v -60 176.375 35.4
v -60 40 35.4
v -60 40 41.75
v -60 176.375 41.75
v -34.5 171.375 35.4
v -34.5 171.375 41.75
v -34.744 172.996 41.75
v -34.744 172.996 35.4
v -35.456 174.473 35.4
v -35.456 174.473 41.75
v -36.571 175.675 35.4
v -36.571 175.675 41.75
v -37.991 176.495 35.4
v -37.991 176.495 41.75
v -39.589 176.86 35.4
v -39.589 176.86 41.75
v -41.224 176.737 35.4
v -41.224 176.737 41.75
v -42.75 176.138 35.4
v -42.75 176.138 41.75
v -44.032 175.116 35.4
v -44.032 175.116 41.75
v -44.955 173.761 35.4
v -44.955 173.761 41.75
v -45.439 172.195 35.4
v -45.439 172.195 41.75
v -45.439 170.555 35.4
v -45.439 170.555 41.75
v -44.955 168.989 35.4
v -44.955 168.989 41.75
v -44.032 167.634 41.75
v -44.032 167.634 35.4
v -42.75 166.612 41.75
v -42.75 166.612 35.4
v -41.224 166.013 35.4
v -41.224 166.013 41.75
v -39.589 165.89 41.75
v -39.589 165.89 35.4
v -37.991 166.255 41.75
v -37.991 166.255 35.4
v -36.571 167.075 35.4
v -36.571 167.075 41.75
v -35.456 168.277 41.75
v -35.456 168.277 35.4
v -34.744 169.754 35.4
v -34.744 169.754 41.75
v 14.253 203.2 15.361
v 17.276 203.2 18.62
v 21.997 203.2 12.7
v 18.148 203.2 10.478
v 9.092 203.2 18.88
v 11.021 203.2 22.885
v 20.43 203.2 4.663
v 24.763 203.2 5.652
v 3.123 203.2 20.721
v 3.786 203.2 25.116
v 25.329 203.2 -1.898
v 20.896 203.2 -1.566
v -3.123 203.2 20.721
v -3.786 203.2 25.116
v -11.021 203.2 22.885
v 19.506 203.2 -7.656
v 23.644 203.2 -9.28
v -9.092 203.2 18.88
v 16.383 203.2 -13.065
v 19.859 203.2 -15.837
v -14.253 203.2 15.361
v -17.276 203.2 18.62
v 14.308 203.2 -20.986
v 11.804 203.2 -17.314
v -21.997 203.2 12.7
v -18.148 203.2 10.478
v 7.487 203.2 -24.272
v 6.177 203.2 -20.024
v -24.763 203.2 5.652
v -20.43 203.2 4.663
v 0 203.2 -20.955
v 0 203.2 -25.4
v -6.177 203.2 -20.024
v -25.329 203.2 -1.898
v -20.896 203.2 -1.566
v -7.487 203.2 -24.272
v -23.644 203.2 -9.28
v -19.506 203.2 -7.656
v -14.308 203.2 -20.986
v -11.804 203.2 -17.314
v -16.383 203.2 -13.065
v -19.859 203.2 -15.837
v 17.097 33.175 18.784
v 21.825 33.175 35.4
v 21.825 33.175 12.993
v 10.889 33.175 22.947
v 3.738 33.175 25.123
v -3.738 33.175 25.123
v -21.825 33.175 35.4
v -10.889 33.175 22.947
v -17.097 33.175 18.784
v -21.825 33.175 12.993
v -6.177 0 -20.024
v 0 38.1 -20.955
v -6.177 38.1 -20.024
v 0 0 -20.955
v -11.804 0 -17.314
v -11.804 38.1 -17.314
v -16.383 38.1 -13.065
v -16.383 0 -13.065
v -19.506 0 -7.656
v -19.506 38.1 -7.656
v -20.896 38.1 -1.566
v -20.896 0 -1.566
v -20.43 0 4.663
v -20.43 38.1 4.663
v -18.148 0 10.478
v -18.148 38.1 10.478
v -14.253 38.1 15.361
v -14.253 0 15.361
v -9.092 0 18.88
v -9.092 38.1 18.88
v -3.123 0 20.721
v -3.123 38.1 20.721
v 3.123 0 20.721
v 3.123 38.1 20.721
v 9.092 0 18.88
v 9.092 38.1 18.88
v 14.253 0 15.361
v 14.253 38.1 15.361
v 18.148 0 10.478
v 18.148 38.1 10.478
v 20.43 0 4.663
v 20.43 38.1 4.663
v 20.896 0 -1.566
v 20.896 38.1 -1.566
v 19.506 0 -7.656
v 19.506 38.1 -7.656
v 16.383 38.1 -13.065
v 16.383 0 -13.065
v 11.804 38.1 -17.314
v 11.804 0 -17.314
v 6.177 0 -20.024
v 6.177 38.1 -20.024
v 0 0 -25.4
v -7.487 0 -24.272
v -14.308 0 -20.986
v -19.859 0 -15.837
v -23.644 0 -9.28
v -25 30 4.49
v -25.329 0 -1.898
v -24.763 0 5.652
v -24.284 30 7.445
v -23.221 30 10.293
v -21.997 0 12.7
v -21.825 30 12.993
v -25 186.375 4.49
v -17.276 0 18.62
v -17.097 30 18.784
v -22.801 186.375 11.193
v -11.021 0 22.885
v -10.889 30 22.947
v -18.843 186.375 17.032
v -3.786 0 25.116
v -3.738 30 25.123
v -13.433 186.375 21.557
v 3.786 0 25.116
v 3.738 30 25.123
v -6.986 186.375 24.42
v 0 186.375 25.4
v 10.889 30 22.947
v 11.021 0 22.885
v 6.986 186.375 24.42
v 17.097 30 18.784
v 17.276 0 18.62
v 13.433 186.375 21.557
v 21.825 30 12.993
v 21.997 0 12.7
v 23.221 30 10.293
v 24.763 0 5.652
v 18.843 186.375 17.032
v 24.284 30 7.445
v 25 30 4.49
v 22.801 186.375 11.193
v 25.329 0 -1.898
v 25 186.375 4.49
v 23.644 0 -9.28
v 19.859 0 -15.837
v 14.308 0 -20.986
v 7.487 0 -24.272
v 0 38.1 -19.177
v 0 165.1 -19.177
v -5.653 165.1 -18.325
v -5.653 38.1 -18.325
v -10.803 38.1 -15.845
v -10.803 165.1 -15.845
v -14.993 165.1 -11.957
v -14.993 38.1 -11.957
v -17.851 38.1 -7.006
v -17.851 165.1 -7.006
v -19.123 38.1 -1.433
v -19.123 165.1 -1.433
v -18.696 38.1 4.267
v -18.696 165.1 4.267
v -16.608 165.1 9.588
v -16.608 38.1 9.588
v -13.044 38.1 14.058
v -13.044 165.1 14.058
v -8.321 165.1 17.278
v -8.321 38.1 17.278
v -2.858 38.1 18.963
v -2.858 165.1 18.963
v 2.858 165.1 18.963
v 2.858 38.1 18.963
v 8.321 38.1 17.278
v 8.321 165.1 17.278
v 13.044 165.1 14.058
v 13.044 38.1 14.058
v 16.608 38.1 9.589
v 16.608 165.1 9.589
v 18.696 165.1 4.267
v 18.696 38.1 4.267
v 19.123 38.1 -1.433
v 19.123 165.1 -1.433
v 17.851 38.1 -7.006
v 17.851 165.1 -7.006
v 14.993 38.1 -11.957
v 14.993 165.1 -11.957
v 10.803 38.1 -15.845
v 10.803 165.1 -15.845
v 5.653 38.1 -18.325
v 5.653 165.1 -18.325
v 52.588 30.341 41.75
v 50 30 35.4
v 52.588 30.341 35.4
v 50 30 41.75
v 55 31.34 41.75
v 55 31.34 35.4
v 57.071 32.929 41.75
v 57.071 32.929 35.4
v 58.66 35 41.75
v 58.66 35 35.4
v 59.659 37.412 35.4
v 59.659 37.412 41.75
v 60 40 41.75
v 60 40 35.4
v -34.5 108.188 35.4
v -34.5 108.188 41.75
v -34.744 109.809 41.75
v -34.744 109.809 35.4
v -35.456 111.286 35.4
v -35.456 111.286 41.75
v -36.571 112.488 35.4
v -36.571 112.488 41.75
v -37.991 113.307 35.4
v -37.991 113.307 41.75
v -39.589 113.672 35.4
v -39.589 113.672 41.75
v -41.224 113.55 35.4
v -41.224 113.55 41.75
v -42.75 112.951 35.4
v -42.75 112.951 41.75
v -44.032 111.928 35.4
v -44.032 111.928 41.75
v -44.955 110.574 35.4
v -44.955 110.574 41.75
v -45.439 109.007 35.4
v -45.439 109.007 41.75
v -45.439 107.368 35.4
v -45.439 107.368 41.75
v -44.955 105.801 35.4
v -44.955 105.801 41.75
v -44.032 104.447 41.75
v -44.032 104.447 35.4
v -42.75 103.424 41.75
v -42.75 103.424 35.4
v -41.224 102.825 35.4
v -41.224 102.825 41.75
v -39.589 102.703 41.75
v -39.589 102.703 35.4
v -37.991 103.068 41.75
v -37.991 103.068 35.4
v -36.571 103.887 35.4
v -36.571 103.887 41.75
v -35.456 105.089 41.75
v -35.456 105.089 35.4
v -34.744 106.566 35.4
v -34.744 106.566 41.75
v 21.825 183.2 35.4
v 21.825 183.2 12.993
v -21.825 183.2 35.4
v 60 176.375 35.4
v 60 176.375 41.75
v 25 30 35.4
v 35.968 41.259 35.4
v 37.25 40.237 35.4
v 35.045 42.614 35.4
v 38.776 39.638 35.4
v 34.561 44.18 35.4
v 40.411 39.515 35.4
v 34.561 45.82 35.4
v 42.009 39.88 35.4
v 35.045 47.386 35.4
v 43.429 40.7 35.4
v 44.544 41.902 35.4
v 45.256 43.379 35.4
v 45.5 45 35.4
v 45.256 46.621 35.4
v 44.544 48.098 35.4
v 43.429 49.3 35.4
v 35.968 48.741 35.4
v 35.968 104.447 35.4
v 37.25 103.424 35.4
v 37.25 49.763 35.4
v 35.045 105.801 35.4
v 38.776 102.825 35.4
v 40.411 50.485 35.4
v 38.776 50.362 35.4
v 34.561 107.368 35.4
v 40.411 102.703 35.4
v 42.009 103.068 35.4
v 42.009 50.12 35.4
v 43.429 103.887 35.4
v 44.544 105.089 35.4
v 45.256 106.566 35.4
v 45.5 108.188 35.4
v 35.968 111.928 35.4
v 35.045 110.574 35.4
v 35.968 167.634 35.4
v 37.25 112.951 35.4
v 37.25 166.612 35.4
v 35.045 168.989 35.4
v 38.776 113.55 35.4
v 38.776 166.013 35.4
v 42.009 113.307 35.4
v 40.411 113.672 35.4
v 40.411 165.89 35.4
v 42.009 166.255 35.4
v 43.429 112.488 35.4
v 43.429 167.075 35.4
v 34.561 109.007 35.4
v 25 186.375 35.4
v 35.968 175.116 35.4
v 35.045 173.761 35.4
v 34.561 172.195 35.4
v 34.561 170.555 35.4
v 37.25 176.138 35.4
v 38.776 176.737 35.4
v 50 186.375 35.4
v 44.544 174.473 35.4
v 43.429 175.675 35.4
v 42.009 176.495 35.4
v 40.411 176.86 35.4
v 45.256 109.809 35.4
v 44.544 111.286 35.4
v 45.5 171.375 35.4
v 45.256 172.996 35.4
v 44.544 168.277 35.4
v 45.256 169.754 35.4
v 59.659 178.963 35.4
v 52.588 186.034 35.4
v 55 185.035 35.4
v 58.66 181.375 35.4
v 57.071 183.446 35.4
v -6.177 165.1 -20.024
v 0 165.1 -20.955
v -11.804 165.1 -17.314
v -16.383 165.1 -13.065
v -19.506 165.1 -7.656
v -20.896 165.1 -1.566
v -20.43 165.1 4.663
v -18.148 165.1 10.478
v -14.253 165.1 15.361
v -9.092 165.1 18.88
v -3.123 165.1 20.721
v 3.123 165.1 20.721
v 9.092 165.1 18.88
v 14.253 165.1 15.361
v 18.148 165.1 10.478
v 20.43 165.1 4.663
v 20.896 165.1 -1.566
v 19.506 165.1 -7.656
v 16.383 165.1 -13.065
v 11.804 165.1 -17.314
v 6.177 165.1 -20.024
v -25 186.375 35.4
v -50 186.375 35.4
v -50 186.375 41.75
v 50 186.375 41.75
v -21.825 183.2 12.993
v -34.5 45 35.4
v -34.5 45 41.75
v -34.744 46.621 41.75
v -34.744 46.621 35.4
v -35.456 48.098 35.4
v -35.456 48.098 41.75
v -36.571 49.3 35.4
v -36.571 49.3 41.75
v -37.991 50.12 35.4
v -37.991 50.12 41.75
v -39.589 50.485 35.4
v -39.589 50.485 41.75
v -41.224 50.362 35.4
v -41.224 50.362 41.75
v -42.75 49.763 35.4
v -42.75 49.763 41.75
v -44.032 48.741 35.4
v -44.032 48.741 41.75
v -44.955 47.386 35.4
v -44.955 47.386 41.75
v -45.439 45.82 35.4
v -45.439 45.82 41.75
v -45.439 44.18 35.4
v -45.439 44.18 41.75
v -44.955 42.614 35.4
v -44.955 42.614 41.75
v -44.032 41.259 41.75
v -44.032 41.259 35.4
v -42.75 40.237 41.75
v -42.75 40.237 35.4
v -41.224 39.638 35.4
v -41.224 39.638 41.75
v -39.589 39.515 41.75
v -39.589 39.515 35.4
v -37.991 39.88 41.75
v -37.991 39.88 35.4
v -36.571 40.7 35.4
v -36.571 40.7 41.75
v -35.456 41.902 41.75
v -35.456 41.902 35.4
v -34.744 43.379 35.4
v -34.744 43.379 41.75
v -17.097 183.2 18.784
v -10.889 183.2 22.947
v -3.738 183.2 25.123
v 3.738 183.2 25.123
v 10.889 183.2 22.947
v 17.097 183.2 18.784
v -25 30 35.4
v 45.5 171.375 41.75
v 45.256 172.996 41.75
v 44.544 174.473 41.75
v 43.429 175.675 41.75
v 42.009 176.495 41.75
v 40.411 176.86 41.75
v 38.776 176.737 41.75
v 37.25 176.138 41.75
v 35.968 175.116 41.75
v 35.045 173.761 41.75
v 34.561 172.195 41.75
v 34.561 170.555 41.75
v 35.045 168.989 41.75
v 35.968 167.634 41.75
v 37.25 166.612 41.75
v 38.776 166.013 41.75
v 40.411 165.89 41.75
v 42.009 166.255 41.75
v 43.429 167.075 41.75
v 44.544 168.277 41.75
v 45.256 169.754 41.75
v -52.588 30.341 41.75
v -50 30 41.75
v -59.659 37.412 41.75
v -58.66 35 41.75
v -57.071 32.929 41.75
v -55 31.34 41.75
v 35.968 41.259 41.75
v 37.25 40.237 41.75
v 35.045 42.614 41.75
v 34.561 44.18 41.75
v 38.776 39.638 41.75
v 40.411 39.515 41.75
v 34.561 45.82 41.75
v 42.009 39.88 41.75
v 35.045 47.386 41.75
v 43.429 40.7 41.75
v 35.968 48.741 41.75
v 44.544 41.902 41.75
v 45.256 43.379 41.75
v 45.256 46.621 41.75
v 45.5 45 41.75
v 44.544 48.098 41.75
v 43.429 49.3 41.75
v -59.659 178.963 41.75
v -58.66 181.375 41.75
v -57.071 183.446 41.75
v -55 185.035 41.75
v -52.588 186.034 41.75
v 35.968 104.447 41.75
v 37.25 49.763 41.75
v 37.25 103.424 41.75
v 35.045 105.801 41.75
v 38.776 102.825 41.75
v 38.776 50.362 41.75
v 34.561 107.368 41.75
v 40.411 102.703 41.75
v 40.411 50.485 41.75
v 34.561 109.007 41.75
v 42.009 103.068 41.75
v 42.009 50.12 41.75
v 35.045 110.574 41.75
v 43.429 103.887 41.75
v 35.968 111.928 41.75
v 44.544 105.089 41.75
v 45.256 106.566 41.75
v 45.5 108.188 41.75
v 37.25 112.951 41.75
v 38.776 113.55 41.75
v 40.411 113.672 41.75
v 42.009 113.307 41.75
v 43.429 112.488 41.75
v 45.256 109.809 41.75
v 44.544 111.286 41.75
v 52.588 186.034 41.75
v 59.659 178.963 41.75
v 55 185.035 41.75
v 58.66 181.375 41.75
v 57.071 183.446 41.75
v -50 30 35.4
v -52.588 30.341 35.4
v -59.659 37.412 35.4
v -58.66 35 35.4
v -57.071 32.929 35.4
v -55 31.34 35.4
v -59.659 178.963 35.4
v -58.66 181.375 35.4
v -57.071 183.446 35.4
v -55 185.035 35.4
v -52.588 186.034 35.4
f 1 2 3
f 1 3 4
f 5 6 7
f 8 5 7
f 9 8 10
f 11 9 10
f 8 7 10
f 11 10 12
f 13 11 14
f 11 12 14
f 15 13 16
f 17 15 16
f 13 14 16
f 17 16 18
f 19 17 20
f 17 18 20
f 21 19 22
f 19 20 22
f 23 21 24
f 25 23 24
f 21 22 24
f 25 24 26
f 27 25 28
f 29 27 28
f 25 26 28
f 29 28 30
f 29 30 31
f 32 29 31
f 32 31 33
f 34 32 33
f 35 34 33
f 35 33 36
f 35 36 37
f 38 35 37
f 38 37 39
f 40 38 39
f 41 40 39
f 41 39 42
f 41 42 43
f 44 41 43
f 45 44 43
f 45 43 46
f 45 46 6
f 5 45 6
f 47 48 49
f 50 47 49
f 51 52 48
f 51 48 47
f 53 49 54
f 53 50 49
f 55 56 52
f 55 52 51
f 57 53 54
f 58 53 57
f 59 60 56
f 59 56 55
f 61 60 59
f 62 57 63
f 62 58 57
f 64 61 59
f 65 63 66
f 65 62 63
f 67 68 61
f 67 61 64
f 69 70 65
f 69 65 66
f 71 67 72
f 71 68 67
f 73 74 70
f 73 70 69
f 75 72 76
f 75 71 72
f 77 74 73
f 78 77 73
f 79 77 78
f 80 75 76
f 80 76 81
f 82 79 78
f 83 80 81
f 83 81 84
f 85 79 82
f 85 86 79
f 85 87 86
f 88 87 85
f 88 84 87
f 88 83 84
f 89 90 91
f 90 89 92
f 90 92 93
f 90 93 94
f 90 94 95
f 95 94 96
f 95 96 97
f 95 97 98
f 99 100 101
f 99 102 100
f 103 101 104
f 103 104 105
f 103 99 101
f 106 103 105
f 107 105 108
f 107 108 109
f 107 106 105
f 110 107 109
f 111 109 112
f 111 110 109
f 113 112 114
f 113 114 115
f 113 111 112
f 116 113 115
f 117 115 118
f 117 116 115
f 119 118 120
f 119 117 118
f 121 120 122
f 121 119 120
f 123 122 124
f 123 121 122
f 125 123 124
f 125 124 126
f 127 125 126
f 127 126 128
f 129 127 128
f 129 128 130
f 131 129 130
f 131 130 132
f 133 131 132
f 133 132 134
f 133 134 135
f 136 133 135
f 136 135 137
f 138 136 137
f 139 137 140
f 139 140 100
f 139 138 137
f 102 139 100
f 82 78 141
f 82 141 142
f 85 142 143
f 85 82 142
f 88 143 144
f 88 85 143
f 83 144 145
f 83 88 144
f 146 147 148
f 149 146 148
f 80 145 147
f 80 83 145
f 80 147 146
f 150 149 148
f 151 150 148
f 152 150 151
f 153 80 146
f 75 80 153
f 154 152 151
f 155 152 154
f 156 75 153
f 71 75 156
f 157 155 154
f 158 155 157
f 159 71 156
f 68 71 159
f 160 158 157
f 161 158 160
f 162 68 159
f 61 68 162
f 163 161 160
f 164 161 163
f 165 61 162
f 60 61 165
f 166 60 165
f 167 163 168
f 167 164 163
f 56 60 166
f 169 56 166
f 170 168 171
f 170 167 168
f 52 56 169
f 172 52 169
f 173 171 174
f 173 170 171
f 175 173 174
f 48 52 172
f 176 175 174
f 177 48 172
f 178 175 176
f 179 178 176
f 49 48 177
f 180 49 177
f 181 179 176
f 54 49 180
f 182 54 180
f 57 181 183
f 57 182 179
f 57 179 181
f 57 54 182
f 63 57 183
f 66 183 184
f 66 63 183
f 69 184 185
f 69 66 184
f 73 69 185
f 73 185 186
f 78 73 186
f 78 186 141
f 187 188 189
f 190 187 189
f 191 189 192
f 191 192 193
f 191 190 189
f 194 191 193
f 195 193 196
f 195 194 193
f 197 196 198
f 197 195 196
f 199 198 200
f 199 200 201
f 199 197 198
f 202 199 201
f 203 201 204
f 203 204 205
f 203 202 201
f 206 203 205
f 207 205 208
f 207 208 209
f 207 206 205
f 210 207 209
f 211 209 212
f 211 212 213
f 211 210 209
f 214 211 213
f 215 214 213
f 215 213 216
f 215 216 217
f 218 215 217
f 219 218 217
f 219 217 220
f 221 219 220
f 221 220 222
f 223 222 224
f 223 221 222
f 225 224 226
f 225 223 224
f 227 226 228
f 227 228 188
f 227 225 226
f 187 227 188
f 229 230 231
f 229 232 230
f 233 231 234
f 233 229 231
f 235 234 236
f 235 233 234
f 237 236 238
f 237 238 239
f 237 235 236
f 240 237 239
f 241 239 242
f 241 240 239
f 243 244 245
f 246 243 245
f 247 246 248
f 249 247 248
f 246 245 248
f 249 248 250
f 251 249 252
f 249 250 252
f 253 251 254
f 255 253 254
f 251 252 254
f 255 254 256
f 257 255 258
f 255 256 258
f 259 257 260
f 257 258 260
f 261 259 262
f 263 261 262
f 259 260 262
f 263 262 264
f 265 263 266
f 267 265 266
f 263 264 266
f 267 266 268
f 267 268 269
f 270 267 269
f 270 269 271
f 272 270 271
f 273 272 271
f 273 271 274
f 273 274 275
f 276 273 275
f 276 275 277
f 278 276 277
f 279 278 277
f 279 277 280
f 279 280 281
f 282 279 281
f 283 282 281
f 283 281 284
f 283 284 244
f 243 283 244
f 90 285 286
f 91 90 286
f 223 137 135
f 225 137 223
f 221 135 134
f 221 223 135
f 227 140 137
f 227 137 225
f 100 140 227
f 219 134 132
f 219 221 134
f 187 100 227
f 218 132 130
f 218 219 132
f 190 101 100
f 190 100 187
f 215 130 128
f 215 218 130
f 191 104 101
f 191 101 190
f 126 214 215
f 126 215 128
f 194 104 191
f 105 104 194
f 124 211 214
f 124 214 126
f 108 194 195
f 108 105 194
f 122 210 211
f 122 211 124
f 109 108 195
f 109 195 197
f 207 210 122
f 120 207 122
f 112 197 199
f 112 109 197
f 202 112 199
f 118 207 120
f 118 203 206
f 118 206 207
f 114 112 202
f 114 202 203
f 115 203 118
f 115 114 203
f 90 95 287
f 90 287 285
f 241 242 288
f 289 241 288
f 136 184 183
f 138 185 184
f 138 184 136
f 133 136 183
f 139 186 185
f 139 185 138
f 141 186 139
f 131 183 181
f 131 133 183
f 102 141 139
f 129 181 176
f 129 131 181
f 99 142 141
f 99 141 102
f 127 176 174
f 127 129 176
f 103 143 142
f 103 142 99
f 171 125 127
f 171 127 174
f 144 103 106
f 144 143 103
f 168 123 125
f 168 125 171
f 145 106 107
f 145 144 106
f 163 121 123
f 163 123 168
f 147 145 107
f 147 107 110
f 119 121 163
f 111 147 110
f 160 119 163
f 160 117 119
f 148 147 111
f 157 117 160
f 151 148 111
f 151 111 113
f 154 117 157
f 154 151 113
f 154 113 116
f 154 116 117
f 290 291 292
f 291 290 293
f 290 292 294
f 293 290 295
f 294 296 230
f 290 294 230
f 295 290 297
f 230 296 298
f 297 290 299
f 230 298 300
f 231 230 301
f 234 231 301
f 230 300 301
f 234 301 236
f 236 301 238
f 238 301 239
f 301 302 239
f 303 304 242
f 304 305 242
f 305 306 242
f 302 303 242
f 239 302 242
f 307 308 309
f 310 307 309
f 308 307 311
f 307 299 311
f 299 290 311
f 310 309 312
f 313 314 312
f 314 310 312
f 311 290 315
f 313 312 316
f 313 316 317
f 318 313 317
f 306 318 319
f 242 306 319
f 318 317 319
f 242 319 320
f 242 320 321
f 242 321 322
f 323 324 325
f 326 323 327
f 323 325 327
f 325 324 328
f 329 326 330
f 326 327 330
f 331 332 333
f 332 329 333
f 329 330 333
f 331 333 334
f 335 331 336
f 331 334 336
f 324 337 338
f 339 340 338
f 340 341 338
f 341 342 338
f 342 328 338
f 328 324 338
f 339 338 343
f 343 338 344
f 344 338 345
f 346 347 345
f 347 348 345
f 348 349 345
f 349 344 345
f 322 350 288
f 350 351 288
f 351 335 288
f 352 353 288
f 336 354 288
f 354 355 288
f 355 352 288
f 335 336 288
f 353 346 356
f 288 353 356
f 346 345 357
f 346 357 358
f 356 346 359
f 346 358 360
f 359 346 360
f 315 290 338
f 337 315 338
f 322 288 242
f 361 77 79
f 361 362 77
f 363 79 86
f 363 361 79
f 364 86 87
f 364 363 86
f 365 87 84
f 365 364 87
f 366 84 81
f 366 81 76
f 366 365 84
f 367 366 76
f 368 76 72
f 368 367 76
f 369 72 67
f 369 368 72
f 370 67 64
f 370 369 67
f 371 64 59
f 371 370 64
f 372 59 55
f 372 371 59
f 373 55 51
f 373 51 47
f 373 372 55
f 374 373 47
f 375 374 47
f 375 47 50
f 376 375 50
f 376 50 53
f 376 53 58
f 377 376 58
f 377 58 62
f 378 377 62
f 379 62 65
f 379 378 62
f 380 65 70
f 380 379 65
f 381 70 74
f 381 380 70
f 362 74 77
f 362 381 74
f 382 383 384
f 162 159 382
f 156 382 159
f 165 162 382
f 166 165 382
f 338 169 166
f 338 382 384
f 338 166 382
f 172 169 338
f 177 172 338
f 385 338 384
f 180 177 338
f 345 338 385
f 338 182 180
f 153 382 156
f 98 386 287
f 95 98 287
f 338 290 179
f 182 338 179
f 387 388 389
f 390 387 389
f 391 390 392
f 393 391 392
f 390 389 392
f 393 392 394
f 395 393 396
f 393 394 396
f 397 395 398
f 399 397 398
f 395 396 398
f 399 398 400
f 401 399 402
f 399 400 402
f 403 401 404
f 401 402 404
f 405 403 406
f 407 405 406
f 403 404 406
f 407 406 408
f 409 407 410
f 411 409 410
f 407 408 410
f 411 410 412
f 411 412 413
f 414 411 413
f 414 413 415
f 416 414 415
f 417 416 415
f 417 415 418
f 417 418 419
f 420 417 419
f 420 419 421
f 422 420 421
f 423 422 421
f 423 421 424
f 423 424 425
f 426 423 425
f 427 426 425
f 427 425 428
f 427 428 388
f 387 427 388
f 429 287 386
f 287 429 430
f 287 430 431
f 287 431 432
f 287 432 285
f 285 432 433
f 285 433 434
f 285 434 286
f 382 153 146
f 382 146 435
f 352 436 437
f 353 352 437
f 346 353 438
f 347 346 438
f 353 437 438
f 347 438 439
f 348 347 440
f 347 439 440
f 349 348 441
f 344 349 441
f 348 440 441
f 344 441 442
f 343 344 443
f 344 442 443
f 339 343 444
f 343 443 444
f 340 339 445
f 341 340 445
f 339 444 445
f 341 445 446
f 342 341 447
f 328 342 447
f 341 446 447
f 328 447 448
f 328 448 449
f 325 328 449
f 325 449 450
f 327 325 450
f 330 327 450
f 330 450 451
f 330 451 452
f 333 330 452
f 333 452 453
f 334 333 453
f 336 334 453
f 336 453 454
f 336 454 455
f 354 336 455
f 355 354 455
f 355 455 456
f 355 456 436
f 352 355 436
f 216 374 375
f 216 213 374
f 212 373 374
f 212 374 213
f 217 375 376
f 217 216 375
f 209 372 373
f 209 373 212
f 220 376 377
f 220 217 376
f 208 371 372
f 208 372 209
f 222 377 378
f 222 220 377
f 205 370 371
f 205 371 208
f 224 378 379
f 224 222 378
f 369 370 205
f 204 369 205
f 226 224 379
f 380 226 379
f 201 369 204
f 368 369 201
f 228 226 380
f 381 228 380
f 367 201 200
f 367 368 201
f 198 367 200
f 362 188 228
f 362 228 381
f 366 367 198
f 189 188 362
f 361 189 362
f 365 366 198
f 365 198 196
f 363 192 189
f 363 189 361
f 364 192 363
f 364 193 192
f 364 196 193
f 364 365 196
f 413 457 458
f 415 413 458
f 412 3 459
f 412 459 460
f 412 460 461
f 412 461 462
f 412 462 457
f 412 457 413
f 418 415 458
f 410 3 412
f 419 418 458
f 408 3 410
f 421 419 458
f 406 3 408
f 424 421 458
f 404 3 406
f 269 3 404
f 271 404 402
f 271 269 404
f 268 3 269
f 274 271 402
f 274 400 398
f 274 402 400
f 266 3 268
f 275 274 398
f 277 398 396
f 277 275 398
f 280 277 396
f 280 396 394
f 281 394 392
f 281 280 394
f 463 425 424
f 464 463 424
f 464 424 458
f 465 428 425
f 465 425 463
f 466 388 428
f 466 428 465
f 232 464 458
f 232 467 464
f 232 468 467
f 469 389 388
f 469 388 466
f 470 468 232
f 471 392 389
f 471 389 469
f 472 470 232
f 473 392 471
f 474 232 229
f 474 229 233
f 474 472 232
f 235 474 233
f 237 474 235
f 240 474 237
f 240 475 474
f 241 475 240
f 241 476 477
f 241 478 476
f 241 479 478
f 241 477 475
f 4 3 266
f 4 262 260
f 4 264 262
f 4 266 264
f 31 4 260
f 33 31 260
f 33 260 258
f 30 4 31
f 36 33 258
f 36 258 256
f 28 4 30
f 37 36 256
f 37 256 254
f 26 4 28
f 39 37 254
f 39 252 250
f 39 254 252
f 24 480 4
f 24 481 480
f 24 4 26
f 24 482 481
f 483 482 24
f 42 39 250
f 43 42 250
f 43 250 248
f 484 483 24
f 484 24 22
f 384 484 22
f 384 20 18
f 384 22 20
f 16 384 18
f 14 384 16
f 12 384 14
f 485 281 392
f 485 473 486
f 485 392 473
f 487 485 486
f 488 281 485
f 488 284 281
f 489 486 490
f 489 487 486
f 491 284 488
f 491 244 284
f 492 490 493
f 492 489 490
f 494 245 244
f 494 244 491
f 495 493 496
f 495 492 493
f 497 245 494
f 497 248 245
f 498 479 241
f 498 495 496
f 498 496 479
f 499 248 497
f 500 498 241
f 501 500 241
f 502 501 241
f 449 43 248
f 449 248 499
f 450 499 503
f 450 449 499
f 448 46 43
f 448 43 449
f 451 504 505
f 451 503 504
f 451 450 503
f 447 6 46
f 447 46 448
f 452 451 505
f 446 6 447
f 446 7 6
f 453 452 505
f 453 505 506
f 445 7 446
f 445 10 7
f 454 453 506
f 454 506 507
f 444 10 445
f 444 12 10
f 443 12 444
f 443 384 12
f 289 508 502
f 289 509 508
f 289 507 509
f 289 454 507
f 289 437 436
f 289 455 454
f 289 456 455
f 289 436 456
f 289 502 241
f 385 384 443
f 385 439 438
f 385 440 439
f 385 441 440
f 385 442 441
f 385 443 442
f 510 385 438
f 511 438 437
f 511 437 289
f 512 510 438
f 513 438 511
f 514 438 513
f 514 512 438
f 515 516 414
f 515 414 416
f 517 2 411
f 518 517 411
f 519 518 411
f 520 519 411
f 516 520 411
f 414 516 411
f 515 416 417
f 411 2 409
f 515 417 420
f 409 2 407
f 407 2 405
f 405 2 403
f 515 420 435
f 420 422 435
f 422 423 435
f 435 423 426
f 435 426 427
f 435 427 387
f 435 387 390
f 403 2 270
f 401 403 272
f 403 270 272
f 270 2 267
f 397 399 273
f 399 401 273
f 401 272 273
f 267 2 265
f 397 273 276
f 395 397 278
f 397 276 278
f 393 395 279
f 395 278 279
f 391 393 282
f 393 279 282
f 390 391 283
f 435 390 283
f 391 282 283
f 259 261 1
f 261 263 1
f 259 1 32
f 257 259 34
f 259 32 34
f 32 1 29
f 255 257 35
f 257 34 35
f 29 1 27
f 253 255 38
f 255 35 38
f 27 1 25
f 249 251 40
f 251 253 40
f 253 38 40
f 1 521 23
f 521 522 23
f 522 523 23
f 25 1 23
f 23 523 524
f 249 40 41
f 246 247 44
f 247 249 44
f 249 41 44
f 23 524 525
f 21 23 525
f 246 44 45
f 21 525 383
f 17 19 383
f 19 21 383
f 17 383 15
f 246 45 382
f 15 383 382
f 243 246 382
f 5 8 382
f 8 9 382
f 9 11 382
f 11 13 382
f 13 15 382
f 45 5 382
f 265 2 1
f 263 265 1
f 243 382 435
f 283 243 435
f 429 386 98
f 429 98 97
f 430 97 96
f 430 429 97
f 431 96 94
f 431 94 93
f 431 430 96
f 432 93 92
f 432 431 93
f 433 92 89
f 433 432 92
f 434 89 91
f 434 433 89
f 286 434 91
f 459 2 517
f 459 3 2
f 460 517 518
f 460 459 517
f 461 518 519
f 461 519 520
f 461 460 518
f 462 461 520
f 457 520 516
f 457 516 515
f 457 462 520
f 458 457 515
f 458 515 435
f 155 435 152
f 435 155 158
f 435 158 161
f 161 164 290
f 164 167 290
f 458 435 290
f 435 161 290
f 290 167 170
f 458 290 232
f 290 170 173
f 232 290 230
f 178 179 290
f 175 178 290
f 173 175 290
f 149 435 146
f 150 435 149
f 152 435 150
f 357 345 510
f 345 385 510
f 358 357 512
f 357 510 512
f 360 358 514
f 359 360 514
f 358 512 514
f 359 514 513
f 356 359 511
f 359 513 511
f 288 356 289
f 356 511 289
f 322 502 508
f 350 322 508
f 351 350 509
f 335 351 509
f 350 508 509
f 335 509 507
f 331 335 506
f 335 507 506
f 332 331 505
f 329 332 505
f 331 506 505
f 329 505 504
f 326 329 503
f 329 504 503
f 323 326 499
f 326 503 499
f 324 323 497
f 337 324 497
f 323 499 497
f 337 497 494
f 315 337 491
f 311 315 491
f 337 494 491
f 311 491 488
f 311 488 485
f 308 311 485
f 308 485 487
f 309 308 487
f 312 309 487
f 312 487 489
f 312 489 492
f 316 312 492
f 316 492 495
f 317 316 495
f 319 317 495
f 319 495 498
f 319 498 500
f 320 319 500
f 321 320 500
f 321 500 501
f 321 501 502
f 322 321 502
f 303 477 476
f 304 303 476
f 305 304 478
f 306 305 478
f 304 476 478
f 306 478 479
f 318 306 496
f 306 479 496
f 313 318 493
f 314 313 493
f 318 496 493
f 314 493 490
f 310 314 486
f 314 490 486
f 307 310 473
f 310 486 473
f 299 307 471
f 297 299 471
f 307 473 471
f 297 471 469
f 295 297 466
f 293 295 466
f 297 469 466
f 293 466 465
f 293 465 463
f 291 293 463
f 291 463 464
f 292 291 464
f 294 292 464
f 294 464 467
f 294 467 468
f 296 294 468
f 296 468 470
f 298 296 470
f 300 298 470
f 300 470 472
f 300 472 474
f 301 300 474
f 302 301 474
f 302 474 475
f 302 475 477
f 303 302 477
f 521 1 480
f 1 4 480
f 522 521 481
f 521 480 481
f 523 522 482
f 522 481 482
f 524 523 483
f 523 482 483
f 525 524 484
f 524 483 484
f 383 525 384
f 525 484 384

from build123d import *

# Parameters (mm, degrees)
BOSS_EXTRUDE1_START   = -3.175
BOSS_EXTRUDE1_DEPTH   = 3.175
BOSS_EXTRUDE9_START   = -153.2
BOSS_EXTRUDE9_DEPTH   = 153.2
BOSS_EXTRUDE5_START   = 3.175
BOSS_EXTRUDE5_DEPTH   = 3.175
SKETCH18_W            = 120
SKETCH18_H            = 156.375
BOSS_EXTRUDE10_DEPTH  = 6.35
FILLET1_R             = 10
M10_CLEARANCE_HOLE2_D = 11


with BuildPart() as part:
    # Sketch12 → Revolve1 (revolve)
    with BuildSketch(Plane.XY, mode=Mode.PRIVATE) as revolve1_sk:
        Polygon((-25.399999994, 0), (-25.399999994, 203.2), (-20.955, 203.2), (-20.955, 165.1), (-19.177, 165.1), (-19.177, 38.1), (-20.955, 38.1), (-20.955, 0), align=None)
    revolve(revolve1_sk.sketch.rotate(Axis((0, 0, 0), (0, 1, 0)), 270), axis=Axis((0, 0, 0), (0, 1, 0)))

    # Sketch14 → Boss-Extrude1 (add)
    with BuildSketch(Plane(origin=(0, 30, 0), x_dir=(-1, 0, 0), z_dir=(0, -1, 0)).offset(BOSS_EXTRUDE1_START)):
        with BuildLine():
            Line((-21.825, -12.993435831), (-21.825, -35.399999994))
            Line((-21.825, -35.399999994), (21.825, -35.399999994))
            Line((21.825, -35.399999994), (21.825, -12.993435831))
            ThreePointArc((21.825, -12.993435831), (0, -25.399999994), (-21.825, -12.993435831))
        make_face()
    extrude(amount=BOSS_EXTRUDE1_DEPTH)

    # Sketch14<4> → Boss-Extrude9 (add)
    with BuildSketch(Plane(origin=(0, 30, 0), x_dir=(-1, 0, 0), z_dir=(0, -1, 0)).offset(BOSS_EXTRUDE9_START)):
        with BuildLine():
            Line((-25, -4.489988829), (-25, -35.399999994))
            Line((-25, -35.399999994), (-21.825, -35.399999994))
            Line((-21.825, -35.399999994), (-21.825, -12.993435831))
            ThreePointArc((-21.825, -12.993435831), (-23.79542622, -8.884688554), (-25, -4.489988829))
        make_face()
        with BuildLine():
            Line((21.825, -12.993435831), (21.825, -35.399999994))
            Line((21.825, -35.399999994), (25, -35.399999994))
            Line((25, -35.399999994), (25, -4.489988829))
            ThreePointArc((25, -4.489988829), (23.79542622, -8.884688554), (21.825, -12.993435831))
        make_face()
    extrude(amount=BOSS_EXTRUDE9_DEPTH)

    # Sketch17 → Boss-Extrude5 (add)
    with BuildSketch(Plane(origin=(0, 183.2, 0), x_dir=(1, 0, 0), z_dir=(0, 1, 0)).offset(BOSS_EXTRUDE5_START)):
        with BuildLine():
            Line((25, -35.399999994), (25, -4.489988829))
            ThreePointArc((25, -4.489988829), (0, -25.399999994), (-25, -4.489988829))
            Line((-25, -4.489988829), (-25, -35.399999994))
            Line((-25, -35.399999994), (25, -35.399999994))
        make_face()
    extrude(amount=-BOSS_EXTRUDE5_DEPTH)

    # Sketch18 → Boss-Extrude10 (add)
    with BuildSketch(Plane.XY.offset(35.399999994)):
        with Locations((0, 108.1875)):
            Rectangle(SKETCH18_W, SKETCH18_H)
    extrude(amount=BOSS_EXTRUDE10_DEPTH)

    # Fillet1
    fillet1_edges = [part.edges().sort_by_distance(p)[0] for p in [
        (-60, 186.375, 38.574999994),
        (-60, 30, 38.574999994),
        (60, 30, 38.574999994),
        (60, 186.375, 38.574999994),
    ]]
    fillet(fillet1_edges, radius=FILLET1_R)

    # M10 Clearance Hole2 (through all)
    with Locations(Plane(origin=(-40, 45, 35.399999994), x_dir=(-1, 0, 0), z_dir=(0, 0, -1))):
        with Locations((0, 0), (0, 63.1875), (0, 126.375), (-80, 126.375), (-80, 63.1875), (-80, 0)):
            Hole(M10_CLEARANCE_HOLE2_D / 2)


solid = part.part
